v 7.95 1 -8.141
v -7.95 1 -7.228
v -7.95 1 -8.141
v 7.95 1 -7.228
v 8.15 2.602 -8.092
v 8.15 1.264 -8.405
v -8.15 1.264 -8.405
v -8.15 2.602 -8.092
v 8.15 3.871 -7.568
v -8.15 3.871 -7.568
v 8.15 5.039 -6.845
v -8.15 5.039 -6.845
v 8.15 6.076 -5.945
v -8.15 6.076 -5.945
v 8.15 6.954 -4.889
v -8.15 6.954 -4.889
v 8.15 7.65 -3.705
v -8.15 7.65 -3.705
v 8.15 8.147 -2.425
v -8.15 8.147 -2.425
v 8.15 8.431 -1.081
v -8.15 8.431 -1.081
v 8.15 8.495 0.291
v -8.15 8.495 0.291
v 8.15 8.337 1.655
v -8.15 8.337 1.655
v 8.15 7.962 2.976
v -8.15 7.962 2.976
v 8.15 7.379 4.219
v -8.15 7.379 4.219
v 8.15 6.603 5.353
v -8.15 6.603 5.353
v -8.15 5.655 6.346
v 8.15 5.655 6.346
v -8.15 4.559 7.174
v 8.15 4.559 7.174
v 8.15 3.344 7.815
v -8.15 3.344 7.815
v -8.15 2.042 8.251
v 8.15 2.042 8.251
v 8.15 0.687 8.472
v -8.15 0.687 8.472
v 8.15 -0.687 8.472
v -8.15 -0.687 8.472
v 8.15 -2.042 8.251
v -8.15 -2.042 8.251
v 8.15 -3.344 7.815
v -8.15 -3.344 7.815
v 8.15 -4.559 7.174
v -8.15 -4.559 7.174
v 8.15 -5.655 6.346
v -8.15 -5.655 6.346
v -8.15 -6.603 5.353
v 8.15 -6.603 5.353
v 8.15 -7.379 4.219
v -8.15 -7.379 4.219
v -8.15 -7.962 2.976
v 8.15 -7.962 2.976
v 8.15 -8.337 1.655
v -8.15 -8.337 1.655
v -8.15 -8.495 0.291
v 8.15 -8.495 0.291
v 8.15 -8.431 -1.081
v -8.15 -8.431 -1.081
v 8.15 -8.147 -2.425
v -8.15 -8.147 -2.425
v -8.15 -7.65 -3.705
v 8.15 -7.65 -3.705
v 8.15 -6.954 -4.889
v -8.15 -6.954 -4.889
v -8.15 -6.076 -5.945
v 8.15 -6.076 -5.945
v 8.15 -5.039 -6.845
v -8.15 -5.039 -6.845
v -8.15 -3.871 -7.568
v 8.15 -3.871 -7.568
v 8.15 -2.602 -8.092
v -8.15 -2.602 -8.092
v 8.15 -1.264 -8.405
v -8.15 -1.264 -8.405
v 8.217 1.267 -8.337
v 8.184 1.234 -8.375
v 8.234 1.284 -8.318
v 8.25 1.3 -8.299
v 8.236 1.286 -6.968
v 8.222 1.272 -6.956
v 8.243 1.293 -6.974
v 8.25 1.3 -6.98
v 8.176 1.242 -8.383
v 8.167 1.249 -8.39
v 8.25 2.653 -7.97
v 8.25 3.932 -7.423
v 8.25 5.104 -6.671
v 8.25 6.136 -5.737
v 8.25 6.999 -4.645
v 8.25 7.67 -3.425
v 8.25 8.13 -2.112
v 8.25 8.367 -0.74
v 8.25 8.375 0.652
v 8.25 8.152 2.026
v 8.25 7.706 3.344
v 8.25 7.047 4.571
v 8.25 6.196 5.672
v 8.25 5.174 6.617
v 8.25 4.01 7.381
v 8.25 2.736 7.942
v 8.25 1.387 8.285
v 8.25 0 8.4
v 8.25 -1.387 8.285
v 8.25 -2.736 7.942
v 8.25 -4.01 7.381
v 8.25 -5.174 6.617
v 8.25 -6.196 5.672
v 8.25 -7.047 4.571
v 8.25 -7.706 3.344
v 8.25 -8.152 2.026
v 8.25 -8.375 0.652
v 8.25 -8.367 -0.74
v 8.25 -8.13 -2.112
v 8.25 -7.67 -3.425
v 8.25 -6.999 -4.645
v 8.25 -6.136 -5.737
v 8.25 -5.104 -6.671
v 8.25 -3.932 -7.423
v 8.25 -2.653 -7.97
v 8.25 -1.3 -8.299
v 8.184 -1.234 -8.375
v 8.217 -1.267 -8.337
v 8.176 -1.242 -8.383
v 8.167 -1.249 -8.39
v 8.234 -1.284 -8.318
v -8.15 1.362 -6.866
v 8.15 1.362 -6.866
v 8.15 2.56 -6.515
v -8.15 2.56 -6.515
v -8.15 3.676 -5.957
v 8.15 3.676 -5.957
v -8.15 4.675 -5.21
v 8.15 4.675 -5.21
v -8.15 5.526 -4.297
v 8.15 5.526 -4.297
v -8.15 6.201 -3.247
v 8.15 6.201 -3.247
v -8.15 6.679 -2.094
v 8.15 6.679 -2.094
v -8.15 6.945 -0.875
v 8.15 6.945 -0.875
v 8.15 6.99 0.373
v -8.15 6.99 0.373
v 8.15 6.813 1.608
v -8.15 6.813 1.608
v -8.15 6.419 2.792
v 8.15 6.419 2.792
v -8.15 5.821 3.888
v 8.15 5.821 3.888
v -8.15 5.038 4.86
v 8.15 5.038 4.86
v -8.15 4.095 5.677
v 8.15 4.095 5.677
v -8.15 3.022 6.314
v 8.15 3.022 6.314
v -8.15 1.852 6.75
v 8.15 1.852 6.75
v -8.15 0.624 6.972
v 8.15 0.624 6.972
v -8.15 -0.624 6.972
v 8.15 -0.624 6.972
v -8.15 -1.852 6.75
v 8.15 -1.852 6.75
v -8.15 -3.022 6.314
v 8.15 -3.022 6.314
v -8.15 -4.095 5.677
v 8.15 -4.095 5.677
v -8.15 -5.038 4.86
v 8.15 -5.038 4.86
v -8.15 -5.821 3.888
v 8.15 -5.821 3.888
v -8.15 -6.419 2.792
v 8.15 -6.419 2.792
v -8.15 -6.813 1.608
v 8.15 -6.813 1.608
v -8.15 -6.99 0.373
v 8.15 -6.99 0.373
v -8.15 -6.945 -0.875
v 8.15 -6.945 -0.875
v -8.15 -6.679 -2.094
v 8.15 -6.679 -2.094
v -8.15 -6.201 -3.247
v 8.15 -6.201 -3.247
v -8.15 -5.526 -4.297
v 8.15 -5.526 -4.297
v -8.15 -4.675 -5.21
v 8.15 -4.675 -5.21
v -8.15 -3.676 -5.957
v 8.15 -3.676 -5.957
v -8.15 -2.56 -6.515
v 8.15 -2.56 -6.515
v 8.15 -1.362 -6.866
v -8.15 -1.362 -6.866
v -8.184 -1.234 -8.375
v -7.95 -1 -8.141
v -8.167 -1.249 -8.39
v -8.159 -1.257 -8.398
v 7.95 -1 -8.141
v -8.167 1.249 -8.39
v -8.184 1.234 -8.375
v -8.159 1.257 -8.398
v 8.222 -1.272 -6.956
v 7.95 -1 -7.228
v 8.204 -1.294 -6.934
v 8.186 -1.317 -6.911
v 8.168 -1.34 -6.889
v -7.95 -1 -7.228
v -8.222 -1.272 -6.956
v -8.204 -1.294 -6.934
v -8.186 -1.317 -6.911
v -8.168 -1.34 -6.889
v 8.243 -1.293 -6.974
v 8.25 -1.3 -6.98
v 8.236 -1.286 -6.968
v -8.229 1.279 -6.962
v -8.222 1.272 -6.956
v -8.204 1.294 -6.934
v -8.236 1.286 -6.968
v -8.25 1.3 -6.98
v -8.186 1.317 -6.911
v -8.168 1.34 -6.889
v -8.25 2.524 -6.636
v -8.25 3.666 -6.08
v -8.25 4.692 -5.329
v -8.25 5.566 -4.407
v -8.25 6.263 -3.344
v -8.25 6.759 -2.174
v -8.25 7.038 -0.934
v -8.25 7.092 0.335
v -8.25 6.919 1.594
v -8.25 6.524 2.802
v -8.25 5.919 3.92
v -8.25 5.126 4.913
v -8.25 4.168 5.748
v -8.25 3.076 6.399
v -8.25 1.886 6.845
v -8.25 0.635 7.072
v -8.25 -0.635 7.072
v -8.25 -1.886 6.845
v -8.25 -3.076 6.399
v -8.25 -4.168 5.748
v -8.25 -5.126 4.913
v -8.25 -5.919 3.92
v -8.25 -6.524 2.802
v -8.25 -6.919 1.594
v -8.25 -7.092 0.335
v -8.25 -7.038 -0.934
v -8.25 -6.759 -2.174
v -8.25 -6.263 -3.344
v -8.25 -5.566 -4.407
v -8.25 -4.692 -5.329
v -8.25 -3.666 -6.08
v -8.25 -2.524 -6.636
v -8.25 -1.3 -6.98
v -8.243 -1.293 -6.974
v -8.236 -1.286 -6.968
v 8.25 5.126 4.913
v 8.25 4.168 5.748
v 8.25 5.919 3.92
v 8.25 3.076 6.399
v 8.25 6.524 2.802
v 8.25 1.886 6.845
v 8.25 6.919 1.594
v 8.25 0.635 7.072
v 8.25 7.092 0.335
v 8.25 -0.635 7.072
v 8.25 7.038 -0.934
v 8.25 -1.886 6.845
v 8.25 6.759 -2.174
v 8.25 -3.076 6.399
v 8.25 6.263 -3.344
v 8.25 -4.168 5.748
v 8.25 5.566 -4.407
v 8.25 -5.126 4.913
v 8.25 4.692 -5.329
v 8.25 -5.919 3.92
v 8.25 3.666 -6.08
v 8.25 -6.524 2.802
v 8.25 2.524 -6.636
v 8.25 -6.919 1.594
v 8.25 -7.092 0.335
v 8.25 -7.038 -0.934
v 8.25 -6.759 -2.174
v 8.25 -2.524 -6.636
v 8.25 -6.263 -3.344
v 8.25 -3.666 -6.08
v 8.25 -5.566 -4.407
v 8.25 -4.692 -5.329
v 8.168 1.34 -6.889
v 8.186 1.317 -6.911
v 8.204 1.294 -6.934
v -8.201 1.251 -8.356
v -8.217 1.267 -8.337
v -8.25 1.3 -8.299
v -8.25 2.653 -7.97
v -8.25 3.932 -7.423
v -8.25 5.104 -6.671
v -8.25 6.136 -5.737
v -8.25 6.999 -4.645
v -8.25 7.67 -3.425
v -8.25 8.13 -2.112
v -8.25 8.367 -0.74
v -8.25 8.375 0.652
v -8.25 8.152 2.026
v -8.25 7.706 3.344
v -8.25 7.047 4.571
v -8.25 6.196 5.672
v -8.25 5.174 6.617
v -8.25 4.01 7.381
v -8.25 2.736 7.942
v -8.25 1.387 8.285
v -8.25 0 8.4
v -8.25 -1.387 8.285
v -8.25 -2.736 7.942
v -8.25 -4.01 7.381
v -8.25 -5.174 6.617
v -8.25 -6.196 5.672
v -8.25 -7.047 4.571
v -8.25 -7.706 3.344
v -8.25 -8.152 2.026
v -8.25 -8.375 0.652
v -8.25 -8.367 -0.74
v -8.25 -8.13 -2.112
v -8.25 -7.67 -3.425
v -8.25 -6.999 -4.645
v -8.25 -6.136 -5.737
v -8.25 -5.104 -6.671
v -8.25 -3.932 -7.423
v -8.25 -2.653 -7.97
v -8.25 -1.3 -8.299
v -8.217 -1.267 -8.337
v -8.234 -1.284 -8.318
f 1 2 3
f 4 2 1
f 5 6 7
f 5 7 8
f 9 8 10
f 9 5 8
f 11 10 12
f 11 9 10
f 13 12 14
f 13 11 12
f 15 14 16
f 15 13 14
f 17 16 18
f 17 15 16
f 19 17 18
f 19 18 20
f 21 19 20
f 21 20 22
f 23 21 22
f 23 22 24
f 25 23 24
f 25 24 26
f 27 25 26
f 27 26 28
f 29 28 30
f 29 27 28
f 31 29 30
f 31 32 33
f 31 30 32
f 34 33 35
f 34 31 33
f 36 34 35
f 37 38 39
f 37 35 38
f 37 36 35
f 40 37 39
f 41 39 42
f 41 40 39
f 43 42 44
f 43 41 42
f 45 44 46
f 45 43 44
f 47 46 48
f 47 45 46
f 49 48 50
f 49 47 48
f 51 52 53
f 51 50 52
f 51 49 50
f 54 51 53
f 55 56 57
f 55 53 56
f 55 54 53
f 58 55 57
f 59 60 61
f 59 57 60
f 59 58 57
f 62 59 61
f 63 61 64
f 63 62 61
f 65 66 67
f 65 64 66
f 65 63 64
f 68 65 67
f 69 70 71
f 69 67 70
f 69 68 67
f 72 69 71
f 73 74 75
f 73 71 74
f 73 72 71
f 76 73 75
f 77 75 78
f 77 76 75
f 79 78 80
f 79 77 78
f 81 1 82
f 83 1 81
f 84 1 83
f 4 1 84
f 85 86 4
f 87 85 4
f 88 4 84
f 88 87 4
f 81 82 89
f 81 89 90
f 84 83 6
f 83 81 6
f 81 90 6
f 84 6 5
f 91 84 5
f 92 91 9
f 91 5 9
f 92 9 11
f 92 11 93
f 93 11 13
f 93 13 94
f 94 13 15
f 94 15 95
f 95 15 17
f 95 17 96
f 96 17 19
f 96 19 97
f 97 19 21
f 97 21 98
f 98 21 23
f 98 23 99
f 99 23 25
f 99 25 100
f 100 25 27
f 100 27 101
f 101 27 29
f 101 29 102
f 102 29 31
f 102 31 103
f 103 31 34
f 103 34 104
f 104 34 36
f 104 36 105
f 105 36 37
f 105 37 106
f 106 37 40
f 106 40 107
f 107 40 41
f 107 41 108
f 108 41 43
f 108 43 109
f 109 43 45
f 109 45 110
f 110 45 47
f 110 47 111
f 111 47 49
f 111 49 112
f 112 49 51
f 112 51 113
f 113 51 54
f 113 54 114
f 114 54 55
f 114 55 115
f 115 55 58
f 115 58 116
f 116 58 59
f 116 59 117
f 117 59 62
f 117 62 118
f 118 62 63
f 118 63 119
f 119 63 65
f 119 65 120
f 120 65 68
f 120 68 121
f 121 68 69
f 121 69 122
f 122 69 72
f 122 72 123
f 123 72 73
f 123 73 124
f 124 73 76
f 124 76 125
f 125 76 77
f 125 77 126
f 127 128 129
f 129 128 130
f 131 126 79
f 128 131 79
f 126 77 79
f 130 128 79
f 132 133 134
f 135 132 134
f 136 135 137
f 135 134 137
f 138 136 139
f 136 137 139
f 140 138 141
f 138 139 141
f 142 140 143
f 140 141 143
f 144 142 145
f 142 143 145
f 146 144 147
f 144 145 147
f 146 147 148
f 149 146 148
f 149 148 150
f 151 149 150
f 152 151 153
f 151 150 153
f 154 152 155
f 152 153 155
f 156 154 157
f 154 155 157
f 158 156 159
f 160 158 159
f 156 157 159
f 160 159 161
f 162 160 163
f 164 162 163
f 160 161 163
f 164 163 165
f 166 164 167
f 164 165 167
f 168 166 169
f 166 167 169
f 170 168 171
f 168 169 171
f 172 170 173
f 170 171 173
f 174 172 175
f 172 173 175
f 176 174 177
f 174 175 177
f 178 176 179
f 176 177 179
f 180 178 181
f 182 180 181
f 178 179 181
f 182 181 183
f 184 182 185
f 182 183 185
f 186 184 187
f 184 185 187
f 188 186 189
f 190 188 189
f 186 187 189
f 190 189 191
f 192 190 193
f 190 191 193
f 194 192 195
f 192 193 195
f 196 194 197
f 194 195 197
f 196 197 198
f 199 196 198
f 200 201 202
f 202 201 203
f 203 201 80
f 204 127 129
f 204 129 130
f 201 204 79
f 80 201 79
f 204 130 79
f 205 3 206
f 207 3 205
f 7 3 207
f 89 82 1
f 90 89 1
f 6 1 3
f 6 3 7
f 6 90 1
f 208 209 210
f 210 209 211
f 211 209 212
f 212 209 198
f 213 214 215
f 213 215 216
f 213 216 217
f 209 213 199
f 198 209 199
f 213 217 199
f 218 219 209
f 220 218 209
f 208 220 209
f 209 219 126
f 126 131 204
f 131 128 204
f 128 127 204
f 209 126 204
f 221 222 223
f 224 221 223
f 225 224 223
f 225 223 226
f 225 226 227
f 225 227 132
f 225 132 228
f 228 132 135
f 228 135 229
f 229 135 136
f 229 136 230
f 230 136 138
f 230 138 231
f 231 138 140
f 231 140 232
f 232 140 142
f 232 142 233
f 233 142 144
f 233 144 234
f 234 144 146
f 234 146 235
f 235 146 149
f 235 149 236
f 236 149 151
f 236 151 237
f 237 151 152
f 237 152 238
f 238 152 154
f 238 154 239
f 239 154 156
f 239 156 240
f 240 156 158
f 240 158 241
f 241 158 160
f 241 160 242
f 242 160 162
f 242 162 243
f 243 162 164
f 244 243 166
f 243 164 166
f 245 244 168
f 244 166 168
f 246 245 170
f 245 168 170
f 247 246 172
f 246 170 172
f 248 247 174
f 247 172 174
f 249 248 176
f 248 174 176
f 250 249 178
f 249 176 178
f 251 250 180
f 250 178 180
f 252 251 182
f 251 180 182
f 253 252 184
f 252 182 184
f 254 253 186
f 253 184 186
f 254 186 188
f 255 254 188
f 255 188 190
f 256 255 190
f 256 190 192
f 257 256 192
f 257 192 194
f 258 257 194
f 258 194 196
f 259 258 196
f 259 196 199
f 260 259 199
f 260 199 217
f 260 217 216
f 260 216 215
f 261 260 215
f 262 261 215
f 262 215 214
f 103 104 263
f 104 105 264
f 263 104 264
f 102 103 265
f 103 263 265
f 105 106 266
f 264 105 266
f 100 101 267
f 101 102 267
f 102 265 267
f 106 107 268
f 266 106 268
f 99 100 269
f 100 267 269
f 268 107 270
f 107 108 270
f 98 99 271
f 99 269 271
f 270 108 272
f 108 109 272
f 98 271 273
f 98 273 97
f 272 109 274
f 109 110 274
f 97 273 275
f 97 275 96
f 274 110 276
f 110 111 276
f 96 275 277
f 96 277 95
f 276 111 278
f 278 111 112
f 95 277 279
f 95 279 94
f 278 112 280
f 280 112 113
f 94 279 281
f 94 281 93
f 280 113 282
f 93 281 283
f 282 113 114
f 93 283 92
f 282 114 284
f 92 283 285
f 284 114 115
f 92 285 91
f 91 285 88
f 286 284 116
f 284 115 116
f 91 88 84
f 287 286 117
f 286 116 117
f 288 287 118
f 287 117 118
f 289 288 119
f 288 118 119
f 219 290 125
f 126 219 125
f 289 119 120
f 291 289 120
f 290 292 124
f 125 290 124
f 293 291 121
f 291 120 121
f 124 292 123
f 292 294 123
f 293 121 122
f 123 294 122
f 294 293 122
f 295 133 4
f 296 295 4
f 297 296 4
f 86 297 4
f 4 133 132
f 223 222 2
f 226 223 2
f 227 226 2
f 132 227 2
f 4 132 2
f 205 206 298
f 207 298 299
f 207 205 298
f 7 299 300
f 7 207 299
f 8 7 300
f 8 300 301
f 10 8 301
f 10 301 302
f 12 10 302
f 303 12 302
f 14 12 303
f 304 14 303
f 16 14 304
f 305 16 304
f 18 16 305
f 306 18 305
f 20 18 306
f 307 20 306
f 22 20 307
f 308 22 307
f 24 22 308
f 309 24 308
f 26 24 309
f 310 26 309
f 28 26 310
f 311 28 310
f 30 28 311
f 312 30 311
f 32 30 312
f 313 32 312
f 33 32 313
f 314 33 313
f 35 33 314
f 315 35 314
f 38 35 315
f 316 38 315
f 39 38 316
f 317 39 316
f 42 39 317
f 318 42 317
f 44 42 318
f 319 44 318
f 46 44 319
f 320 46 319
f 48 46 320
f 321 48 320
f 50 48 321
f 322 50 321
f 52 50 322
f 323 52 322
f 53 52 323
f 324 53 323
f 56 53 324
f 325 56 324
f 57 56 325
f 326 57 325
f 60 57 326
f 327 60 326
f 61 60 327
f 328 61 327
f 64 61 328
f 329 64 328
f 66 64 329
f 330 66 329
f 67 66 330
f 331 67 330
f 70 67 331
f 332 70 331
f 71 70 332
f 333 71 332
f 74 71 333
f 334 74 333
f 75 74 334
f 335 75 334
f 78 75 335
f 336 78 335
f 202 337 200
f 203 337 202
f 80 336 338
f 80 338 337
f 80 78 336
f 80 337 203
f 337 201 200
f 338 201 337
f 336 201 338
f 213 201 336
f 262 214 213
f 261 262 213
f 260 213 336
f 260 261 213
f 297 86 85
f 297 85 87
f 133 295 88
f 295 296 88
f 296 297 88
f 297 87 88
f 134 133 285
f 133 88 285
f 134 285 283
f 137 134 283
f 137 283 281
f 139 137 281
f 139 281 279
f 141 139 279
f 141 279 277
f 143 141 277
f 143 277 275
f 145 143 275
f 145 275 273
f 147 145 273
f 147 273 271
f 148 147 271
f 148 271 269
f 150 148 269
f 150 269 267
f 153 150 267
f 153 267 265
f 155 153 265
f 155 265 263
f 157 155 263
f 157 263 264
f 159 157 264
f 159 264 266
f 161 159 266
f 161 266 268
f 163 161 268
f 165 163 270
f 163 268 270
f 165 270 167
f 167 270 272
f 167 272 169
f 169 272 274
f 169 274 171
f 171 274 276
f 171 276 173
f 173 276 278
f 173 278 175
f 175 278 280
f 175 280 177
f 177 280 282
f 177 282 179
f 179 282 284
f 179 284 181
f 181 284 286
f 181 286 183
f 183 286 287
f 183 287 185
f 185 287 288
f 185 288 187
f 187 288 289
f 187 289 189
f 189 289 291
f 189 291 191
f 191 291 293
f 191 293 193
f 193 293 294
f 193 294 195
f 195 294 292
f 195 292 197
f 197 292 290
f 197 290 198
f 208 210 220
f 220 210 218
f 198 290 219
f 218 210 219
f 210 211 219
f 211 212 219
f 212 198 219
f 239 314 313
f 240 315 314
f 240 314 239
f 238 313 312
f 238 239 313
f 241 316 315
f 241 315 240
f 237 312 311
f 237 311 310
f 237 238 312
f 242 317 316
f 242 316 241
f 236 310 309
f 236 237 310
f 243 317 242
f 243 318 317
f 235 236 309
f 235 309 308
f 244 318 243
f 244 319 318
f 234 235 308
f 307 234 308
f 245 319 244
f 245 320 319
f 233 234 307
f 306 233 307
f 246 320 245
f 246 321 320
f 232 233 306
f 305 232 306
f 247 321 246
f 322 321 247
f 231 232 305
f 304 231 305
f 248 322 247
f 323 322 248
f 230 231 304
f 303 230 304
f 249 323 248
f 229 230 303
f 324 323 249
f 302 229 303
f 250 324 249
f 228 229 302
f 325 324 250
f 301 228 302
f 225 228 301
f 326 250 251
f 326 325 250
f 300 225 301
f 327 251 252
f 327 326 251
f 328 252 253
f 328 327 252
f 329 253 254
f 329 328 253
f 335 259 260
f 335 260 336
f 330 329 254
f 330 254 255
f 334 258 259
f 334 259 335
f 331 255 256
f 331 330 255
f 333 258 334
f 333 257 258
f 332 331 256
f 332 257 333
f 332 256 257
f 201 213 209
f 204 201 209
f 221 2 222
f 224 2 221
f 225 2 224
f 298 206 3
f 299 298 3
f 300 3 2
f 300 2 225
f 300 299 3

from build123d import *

# Parameters (mm, degrees)
SKETCH1_W          = 16.5
SKETCH1_H          = 1.5
CHAMFER1_SIZE      = 0.1
SKETCH2_W          = 43.906364016
SKETCH2_H          = 2
CUT_EXTRUDE1_DEPTH = 15.579523312
CHAMFER2_SIZE      = 0.3


with BuildPart() as part:
    # Sketch1 → Revolve1 (revolve)
    with BuildSketch(Plane.XY, mode=Mode.PRIVATE) as revolve1_sk:
        with Locations((0, 7.75)):
            Rectangle(SKETCH1_W, SKETCH1_H)
    revolve(revolve1_sk.sketch.rotate(Axis((0, 0, 0), (1, 0, 0)), 90), axis=Axis((0, 0, 0), (1, 0, 0)))

    # Chamfer1
    chamfer1_edges = [part.edges().sort_by_distance(p)[0] for p in [
        (-8.25, 0, -7),
        (8.25, 0, -7),
        (8.25, 0, -8.5),
        (-8.25, 0, -8.5),
    ]]
    chamfer(chamfer1_edges, length=CHAMFER1_SIZE)

    # Sketch2 → Cut-Extrude1 (cut, through all)
    with BuildSketch(Plane.XY):
        Rectangle(SKETCH2_W, SKETCH2_H)
    extrude(amount=-CUT_EXTRUDE1_DEPTH, mode=Mode.SUBTRACT)

    # Chamfer2
    # the kernel refuses this chamfer: 0.354238868, 0.3, 0.270099322 mm, written as the material it takes off along each edge
    with BuildSketch(Plane(origin=(8.25, 1, -6.257719812), x_dir=(-1, 0, 0), z_dir=(0, 0, -1)), Plane(origin=(-8.25, 1, -9.111768681), x_dir=(1, 0, 0), z_dir=(0, 0, 1)), Plane(origin=(-8.25, -1, -6.257719812), x_dir=(1, 0, 0), z_dir=(0, 0, -1))) as chamfer2_piece_1:
        Polygon((CHAMFER2_SIZE, 0), (0, CHAMFER2_SIZE), (0, 0), align=None)
    extrude(amount=2.854048869, mode=Mode.SUBTRACT)
    with BuildSketch(Plane(origin=(8.25, -1, -9.111768681), x_dir=(0, -1, 0), z_dir=(0, 0, 1))) as chamfer2_piece_2:
        Polygon((CHAMFER2_SIZE, 0), (0, -CHAMFER2_SIZE), (0, 0), align=None)
    extrude(amount=2.854048869, mode=Mode.SUBTRACT)
    with BuildSketch(Plane(origin=(8.921504896, -1, -8.440971508), x_dir=(0, 0, 1), z_dir=(-1, 0, 0))) as chamfer2_piece_3:
        with BuildLine():
            Line((CHAMFER2_SIZE, 0), (0.035547132, -0.264452868))
            ThreePointArc((0.035547132, -0.264452868), (0.01722122, -0.135971426), (0, 0))
            Line((0, 0), (CHAMFER2_SIZE, 0))
        make_face()
    extrude(amount=17.843009793, mode=Mode.SUBTRACT)
    with BuildSketch(Plane(origin=(8.921504896, 1, -8.440971508), x_dir=(0, 0, 1), z_dir=(-1, 0, 0))) as chamfer2_piece_4:
        with BuildLine():
            Line((CHAMFER2_SIZE, 0), (0.035547132, 0.264452868))
            ThreePointArc((0.035547132, 0.264452868), (0.01722122, 0.135971426), (0, 0))
            Line((0, 0), (CHAMFER2_SIZE, 0))
        make_face()
    extrude(amount=17.843009793, mode=Mode.SUBTRACT)
    with BuildSketch(Plane(origin=(-9.097260331, -1, -6.92820323), x_dir=(0, 0, -1), z_dir=(1, 0, 0))) as chamfer2_piece_5:
        with BuildLine():
            Line((CHAMFER2_SIZE, 0), (-0.061980996, -0.361980996))
            ThreePointArc((-0.061980996, -0.361980996), (-0.029595535, -0.187102296), (0, 0))
            Line((0, 0), (CHAMFER2_SIZE, 0))
        make_face()
    extrude(amount=18.194520662, mode=Mode.SUBTRACT)
    with BuildSketch(Plane(origin=(-9.097260331, 1, -6.92820323), x_dir=(0, 0.9856552884232092, 0.16877100581367702), z_dir=(1, 0, 0))) as chamfer2_piece_6:
        with BuildLine():
            Line((0.367249078, 0), (-CHAMFER2_SIZE * 0.168771005814, -CHAMFER2_SIZE * 0.985655288423))
            Line((-CHAMFER2_SIZE * 0.168771005814, -CHAMFER2_SIZE * 0.985655288423), (0, 0))
            ThreePointArc((0, 0), (0.189413236, -0.002406447), (0.367249078, 0))
        make_face()
    extrude(amount=18.194520662, mode=Mode.SUBTRACT)


solid = part.part
